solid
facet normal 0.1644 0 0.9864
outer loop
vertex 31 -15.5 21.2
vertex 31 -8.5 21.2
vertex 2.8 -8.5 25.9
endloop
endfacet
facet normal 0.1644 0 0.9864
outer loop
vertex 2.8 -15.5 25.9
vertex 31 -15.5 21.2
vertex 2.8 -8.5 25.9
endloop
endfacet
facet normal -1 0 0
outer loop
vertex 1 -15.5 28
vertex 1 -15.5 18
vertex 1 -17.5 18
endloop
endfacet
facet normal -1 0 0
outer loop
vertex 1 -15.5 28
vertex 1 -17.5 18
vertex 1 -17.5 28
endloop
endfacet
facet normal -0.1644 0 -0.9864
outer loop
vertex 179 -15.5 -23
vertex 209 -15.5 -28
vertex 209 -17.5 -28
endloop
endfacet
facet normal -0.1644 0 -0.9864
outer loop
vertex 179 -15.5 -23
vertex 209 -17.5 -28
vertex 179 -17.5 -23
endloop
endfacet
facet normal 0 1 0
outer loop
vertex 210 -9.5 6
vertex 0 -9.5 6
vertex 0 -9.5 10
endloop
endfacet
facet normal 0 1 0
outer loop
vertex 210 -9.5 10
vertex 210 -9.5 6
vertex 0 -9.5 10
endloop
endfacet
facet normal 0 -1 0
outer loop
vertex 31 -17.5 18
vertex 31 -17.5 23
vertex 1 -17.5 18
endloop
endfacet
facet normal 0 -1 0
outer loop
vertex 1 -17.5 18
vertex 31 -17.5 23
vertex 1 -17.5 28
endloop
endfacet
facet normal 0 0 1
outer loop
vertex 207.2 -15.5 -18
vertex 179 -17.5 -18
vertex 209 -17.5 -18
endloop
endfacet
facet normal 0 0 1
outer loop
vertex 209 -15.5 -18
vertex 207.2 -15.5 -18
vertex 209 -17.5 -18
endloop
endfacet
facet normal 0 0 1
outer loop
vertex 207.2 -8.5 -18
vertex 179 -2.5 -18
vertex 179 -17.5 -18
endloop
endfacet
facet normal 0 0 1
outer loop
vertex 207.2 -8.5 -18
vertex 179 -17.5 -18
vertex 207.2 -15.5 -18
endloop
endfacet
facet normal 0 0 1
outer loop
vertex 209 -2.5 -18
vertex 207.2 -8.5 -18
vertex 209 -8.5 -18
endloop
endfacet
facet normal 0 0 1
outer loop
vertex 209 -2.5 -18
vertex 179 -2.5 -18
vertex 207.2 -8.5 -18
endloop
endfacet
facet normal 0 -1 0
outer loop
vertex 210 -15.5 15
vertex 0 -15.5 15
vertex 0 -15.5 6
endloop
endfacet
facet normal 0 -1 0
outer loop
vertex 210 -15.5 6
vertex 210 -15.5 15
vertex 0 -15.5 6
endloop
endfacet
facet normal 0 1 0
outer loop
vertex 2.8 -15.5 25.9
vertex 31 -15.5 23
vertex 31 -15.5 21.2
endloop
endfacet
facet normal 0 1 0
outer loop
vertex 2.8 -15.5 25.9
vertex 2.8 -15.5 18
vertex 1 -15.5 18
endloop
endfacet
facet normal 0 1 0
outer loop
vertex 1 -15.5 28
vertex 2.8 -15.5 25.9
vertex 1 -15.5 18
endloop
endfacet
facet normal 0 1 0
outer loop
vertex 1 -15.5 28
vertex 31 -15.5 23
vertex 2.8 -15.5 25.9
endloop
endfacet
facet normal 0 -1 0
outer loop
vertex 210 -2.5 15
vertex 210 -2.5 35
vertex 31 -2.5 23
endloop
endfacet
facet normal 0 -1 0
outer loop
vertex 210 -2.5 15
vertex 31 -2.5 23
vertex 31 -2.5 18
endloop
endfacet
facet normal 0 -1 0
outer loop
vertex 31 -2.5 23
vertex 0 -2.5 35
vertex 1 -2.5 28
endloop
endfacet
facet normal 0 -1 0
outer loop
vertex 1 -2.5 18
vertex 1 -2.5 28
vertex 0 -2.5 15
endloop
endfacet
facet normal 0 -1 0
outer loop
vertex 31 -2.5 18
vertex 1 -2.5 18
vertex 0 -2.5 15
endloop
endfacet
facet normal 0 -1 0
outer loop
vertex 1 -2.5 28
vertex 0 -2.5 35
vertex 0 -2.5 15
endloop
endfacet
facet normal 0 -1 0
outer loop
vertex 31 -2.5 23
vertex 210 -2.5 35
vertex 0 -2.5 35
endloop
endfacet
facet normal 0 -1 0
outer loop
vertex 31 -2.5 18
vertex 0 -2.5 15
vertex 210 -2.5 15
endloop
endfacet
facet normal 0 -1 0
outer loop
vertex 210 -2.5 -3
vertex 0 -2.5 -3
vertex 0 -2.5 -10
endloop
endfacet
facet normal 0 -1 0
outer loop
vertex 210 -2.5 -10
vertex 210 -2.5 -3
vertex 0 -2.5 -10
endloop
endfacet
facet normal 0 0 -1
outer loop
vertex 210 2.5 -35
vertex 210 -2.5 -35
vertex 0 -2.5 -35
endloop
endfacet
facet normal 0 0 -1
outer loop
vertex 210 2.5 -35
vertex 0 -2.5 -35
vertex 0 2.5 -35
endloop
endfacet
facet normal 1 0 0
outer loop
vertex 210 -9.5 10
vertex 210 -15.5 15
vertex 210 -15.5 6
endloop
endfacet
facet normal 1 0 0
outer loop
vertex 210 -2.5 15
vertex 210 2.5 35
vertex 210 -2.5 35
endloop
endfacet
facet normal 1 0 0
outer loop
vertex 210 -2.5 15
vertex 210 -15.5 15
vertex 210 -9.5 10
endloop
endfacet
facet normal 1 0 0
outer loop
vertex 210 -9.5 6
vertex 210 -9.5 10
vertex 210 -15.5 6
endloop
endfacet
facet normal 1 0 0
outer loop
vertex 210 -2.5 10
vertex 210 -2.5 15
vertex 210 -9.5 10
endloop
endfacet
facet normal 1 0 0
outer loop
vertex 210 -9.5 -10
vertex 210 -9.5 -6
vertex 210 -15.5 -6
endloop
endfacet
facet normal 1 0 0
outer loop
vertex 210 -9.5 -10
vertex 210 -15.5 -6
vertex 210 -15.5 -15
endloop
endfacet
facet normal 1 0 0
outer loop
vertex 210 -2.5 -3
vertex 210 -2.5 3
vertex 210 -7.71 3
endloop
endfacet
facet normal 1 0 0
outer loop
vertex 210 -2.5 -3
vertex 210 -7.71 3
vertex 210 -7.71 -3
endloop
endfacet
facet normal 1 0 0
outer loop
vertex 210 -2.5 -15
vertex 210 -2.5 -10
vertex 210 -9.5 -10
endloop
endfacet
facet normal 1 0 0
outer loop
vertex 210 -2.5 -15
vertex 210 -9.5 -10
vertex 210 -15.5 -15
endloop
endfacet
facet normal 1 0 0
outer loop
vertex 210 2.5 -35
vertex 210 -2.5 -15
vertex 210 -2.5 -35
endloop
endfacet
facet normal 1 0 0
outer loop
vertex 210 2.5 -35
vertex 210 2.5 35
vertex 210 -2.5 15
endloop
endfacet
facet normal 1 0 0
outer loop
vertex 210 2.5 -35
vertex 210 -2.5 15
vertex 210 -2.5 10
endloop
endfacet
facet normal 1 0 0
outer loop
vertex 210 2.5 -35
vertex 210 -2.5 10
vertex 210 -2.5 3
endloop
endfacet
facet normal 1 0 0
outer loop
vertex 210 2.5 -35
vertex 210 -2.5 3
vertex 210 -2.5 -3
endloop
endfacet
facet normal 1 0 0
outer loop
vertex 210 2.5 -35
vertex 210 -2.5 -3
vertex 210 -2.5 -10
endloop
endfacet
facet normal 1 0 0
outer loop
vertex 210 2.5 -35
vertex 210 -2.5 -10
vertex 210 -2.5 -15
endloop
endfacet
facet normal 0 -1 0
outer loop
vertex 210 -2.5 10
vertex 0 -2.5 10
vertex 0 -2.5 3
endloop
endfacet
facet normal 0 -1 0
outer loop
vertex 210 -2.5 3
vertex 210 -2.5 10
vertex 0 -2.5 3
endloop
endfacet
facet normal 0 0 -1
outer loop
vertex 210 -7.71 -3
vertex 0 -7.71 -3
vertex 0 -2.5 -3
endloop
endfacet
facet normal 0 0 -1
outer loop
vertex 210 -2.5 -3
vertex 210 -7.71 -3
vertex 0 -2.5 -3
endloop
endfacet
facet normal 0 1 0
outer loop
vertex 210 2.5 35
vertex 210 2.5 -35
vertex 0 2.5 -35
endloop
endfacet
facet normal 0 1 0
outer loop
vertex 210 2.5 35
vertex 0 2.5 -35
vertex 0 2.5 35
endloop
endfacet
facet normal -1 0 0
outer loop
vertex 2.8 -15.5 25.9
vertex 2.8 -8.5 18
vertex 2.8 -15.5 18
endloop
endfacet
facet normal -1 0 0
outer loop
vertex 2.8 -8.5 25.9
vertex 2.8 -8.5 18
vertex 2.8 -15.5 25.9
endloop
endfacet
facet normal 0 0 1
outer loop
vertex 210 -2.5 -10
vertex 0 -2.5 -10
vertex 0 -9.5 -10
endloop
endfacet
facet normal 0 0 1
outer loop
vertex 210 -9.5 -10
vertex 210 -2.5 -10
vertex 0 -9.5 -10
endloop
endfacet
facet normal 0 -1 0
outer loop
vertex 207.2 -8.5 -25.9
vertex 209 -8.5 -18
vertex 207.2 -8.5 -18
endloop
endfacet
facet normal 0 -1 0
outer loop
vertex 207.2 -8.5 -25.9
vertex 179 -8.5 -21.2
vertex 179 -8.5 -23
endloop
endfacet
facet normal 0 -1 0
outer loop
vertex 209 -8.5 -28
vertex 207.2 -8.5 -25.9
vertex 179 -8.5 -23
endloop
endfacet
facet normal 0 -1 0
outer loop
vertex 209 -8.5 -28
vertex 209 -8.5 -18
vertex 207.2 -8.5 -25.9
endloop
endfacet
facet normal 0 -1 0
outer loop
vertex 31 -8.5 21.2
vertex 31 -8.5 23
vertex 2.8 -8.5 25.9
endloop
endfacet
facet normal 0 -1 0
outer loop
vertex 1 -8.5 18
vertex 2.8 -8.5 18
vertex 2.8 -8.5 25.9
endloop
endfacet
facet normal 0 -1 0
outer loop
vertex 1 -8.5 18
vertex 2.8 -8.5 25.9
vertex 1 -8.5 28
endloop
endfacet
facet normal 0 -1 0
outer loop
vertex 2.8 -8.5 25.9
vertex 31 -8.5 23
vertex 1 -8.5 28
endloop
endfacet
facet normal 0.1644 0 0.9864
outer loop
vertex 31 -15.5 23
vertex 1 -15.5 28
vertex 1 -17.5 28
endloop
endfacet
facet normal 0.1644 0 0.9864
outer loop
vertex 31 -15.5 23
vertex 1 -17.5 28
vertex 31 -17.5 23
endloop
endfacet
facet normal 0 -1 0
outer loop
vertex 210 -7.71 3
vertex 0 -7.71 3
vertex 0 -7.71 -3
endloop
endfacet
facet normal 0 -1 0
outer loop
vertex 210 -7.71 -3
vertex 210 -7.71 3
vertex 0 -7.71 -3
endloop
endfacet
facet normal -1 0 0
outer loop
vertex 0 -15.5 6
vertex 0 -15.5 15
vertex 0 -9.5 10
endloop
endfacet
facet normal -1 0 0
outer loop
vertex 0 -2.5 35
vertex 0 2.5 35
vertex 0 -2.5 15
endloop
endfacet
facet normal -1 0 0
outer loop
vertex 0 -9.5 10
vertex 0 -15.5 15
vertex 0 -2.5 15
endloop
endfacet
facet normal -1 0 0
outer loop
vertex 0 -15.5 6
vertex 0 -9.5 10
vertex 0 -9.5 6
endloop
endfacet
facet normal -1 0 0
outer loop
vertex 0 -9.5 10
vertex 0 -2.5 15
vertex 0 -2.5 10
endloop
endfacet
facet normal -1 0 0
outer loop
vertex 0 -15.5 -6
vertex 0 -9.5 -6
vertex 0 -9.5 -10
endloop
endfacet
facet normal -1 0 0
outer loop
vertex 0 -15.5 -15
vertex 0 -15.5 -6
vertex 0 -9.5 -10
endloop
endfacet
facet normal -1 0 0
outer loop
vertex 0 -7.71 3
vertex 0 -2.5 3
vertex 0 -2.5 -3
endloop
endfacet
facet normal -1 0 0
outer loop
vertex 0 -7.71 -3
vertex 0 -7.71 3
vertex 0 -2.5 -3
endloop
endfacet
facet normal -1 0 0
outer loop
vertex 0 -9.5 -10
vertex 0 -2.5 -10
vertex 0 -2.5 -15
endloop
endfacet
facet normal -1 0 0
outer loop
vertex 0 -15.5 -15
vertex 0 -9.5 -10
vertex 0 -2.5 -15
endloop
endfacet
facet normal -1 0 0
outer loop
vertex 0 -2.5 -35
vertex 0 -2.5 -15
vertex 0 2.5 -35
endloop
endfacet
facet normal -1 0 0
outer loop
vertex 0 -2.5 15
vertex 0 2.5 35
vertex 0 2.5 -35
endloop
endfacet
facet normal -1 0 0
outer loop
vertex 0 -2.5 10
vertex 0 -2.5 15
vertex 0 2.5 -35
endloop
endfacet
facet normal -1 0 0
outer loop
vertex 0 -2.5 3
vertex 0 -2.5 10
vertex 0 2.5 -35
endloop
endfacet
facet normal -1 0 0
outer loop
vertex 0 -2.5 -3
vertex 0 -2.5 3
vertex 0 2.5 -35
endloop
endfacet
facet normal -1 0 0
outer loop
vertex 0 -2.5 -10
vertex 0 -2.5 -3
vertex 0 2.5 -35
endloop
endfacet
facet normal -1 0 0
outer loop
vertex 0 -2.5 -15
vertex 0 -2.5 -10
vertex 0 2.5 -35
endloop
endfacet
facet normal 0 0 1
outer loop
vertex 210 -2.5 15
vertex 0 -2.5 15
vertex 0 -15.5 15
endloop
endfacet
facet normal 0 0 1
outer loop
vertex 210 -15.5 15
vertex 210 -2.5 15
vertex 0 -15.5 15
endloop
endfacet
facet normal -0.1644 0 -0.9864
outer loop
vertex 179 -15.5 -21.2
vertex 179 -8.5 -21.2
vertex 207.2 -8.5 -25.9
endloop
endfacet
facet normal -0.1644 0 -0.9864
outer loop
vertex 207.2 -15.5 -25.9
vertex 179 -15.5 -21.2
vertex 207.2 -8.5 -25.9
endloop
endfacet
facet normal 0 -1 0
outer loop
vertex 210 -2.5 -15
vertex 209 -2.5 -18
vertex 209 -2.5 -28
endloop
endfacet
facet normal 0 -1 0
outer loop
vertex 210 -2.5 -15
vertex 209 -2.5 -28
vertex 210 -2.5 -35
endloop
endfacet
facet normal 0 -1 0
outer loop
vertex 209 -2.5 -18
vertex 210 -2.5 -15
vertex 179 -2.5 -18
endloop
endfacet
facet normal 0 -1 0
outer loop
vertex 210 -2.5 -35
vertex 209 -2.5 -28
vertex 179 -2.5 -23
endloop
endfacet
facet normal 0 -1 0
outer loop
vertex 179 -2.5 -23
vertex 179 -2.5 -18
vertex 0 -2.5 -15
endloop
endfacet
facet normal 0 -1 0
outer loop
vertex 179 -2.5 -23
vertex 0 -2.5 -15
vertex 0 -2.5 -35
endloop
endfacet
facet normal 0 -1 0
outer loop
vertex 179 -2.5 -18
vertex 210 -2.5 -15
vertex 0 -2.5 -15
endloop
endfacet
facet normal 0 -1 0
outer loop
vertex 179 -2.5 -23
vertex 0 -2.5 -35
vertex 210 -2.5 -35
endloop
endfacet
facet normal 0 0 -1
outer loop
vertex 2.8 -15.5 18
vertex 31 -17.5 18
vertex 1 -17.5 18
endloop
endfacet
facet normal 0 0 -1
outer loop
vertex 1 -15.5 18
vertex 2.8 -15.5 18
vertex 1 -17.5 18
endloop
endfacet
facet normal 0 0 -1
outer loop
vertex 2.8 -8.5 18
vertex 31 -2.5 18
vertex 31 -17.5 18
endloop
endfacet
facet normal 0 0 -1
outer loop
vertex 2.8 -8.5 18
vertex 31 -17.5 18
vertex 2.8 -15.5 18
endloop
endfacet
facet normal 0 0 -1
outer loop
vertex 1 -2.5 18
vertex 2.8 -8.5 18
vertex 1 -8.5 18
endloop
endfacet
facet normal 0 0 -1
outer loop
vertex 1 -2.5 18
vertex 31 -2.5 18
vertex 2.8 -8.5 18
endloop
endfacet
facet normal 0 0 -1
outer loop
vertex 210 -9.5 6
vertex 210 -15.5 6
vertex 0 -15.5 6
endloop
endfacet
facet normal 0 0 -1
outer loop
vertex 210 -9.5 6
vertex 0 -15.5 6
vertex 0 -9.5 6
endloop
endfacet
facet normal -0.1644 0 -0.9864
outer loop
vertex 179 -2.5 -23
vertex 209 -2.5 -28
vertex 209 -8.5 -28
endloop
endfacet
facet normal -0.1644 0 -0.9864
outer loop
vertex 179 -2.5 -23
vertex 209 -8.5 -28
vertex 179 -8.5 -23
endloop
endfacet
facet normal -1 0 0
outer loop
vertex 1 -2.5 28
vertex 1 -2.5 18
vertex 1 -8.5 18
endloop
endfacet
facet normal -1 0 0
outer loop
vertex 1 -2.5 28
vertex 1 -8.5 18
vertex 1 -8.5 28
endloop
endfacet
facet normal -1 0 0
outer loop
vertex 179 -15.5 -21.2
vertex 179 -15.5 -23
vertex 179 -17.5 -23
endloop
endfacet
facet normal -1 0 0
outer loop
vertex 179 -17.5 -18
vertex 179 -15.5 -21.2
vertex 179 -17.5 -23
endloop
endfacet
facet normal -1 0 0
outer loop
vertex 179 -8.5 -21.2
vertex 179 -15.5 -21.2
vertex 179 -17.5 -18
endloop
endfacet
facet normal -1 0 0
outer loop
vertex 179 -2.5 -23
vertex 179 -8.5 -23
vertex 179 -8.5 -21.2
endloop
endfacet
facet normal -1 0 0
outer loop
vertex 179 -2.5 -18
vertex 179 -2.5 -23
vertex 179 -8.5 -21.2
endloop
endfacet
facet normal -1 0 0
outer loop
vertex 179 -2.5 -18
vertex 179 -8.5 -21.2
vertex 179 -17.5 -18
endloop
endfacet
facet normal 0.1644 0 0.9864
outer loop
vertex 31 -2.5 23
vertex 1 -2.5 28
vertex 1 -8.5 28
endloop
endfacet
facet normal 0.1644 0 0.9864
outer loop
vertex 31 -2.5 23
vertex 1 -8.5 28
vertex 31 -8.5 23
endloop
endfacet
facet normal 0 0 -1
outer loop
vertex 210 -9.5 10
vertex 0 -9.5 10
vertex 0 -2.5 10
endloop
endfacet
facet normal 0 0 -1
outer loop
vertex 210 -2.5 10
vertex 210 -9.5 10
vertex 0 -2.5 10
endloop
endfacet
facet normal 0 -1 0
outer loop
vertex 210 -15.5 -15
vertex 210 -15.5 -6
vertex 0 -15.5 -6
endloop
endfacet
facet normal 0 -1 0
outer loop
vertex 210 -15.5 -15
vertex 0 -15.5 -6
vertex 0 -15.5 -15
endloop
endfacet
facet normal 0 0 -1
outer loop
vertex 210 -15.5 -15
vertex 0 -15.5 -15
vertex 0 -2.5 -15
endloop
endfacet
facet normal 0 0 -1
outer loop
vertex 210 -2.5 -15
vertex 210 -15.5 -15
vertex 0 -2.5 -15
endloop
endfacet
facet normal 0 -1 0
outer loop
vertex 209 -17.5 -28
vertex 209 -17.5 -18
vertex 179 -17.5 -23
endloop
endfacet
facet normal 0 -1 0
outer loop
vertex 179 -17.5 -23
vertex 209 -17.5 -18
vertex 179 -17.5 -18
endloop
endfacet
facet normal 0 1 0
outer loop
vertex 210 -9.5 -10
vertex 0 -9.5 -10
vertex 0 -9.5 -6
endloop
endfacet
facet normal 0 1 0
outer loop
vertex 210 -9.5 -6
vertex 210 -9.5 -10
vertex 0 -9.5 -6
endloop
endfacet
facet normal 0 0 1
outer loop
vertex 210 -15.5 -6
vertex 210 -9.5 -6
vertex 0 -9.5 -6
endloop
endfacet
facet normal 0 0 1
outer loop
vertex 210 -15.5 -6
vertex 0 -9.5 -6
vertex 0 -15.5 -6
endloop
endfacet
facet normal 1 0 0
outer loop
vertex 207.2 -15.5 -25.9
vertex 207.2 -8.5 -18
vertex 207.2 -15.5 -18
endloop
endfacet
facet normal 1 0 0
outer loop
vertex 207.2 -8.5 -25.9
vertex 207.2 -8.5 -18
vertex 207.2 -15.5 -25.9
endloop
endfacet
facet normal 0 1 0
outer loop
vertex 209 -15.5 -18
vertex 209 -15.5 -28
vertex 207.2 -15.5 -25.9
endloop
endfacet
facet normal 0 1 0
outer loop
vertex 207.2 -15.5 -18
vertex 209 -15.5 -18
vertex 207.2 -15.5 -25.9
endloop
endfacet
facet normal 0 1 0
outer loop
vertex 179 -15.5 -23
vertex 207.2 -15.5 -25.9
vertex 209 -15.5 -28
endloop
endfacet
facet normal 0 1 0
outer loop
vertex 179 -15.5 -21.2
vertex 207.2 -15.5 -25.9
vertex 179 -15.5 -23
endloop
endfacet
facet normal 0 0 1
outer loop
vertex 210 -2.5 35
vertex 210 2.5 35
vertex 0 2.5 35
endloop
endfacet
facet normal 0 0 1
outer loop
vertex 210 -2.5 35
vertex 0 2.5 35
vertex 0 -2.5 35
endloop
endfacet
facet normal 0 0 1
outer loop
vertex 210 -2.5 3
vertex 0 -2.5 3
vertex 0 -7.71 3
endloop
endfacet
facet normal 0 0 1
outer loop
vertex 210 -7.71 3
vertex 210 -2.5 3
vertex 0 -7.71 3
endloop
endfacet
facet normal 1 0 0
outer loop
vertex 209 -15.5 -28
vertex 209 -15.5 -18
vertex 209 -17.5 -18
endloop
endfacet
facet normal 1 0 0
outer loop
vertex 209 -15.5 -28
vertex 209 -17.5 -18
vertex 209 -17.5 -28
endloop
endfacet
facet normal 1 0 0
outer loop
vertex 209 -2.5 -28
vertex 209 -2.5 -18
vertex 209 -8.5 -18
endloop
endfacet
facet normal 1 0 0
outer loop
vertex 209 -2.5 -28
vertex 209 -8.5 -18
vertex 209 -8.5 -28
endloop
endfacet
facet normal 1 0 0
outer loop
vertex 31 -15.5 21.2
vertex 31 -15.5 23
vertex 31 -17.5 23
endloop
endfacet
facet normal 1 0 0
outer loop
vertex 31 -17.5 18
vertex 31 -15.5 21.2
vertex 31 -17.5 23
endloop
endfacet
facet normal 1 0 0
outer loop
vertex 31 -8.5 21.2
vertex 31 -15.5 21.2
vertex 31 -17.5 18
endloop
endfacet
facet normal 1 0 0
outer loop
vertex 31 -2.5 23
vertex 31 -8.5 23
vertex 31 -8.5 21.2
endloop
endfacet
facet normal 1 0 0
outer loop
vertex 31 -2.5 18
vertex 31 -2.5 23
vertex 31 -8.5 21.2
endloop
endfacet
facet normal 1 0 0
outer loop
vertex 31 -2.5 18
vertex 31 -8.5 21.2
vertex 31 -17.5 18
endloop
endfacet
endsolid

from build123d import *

# Parameters (mm, degrees)
BOSS_EXTRUDE1_DEPTH = 210
BOSS_EXTRUDE2_DEPTH = 15
SKETCH3_W           = 10
SKETCH3_H           = 7
CUT_EXTRUDE1_DEPTH  = 1.8
SKETCH5_W           = 10
SKETCH5_H           = 7
CUT_EXTRUDE2_DEPTH  = 1.8
CUT_EXTRUDE3_DEPTH  = 7
CUT_EXTRUDE4_DEPTH  = 7


with BuildPart() as part:
    # Sketch1 → Boss-Extrude1 (new body)
    with BuildSketch(Plane(origin=(0, 0, 0), x_dir=(0, 0, -1), z_dir=(1, 0, 0))):
        Polygon((-35, -2.5), (-15, -2.5), (-15, -15.5), (-6, -15.5), (-6, -9.5), (-10, -9.5), (-10, -2.5), (-3, -2.5), (-3, -7.710081811), (3, -7.710081811), (3, -2.5), (10, -2.5), (10, -9.5), (6, -9.5), (6, -15.5), (15, -15.5), (15, -2.5), (35, -2.5), (35, 2.5), (-35, 2.5), align=None)
    extrude(amount=BOSS_EXTRUDE1_DEPTH)

    # Sketch2 → Boss-Extrude2 (add)
    with BuildSketch(Plane.XZ.offset(2.5)):
        Polygon((1, 28), (31, 23), (31, 18), (1, 18), align=None)
        Polygon((209, -18), (209, -28), (179, -23), (179, -18), align=None)
    extrude(amount=BOSS_EXTRUDE2_DEPTH)

    # Sketch3 → Cut-Extrude1 (cut)
    with BuildSketch(Plane.ZY.offset(-1)):
        with Locations((23, -12)):
            Rectangle(SKETCH3_W, SKETCH3_H)
    extrude(amount=-CUT_EXTRUDE1_DEPTH, mode=Mode.SUBTRACT)

    # Sketch5 → Cut-Extrude2 (cut)
    with BuildSketch(Plane(origin=(209, 0, 0), x_dir=(0, 0, -1), z_dir=(1, 0, 0))):
        with Locations((23, -12)):
            Rectangle(SKETCH5_W, SKETCH5_H)
    extrude(amount=-CUT_EXTRUDE2_DEPTH, mode=Mode.SUBTRACT)

    # Sketch7 → Cut-Extrude3 (cut)
    with BuildSketch(Plane.XZ.offset(8.5)):
        Polygon((207.2, -27.7), (179, -23), (179, -21.2), (207.2, -25.9), align=None)
    extrude(amount=CUT_EXTRUDE3_DEPTH, mode=Mode.SUBTRACT)

    # Sketch8 → Cut-Extrude4 (cut)
    with BuildSketch(Plane.XZ.offset(8.5)):
        Polygon((2.8, 27.7), (31, 23), (31, 21.2), (2.8, 25.9), align=None)
    extrude(amount=CUT_EXTRUDE4_DEPTH, mode=Mode.SUBTRACT)


solid = part.part
